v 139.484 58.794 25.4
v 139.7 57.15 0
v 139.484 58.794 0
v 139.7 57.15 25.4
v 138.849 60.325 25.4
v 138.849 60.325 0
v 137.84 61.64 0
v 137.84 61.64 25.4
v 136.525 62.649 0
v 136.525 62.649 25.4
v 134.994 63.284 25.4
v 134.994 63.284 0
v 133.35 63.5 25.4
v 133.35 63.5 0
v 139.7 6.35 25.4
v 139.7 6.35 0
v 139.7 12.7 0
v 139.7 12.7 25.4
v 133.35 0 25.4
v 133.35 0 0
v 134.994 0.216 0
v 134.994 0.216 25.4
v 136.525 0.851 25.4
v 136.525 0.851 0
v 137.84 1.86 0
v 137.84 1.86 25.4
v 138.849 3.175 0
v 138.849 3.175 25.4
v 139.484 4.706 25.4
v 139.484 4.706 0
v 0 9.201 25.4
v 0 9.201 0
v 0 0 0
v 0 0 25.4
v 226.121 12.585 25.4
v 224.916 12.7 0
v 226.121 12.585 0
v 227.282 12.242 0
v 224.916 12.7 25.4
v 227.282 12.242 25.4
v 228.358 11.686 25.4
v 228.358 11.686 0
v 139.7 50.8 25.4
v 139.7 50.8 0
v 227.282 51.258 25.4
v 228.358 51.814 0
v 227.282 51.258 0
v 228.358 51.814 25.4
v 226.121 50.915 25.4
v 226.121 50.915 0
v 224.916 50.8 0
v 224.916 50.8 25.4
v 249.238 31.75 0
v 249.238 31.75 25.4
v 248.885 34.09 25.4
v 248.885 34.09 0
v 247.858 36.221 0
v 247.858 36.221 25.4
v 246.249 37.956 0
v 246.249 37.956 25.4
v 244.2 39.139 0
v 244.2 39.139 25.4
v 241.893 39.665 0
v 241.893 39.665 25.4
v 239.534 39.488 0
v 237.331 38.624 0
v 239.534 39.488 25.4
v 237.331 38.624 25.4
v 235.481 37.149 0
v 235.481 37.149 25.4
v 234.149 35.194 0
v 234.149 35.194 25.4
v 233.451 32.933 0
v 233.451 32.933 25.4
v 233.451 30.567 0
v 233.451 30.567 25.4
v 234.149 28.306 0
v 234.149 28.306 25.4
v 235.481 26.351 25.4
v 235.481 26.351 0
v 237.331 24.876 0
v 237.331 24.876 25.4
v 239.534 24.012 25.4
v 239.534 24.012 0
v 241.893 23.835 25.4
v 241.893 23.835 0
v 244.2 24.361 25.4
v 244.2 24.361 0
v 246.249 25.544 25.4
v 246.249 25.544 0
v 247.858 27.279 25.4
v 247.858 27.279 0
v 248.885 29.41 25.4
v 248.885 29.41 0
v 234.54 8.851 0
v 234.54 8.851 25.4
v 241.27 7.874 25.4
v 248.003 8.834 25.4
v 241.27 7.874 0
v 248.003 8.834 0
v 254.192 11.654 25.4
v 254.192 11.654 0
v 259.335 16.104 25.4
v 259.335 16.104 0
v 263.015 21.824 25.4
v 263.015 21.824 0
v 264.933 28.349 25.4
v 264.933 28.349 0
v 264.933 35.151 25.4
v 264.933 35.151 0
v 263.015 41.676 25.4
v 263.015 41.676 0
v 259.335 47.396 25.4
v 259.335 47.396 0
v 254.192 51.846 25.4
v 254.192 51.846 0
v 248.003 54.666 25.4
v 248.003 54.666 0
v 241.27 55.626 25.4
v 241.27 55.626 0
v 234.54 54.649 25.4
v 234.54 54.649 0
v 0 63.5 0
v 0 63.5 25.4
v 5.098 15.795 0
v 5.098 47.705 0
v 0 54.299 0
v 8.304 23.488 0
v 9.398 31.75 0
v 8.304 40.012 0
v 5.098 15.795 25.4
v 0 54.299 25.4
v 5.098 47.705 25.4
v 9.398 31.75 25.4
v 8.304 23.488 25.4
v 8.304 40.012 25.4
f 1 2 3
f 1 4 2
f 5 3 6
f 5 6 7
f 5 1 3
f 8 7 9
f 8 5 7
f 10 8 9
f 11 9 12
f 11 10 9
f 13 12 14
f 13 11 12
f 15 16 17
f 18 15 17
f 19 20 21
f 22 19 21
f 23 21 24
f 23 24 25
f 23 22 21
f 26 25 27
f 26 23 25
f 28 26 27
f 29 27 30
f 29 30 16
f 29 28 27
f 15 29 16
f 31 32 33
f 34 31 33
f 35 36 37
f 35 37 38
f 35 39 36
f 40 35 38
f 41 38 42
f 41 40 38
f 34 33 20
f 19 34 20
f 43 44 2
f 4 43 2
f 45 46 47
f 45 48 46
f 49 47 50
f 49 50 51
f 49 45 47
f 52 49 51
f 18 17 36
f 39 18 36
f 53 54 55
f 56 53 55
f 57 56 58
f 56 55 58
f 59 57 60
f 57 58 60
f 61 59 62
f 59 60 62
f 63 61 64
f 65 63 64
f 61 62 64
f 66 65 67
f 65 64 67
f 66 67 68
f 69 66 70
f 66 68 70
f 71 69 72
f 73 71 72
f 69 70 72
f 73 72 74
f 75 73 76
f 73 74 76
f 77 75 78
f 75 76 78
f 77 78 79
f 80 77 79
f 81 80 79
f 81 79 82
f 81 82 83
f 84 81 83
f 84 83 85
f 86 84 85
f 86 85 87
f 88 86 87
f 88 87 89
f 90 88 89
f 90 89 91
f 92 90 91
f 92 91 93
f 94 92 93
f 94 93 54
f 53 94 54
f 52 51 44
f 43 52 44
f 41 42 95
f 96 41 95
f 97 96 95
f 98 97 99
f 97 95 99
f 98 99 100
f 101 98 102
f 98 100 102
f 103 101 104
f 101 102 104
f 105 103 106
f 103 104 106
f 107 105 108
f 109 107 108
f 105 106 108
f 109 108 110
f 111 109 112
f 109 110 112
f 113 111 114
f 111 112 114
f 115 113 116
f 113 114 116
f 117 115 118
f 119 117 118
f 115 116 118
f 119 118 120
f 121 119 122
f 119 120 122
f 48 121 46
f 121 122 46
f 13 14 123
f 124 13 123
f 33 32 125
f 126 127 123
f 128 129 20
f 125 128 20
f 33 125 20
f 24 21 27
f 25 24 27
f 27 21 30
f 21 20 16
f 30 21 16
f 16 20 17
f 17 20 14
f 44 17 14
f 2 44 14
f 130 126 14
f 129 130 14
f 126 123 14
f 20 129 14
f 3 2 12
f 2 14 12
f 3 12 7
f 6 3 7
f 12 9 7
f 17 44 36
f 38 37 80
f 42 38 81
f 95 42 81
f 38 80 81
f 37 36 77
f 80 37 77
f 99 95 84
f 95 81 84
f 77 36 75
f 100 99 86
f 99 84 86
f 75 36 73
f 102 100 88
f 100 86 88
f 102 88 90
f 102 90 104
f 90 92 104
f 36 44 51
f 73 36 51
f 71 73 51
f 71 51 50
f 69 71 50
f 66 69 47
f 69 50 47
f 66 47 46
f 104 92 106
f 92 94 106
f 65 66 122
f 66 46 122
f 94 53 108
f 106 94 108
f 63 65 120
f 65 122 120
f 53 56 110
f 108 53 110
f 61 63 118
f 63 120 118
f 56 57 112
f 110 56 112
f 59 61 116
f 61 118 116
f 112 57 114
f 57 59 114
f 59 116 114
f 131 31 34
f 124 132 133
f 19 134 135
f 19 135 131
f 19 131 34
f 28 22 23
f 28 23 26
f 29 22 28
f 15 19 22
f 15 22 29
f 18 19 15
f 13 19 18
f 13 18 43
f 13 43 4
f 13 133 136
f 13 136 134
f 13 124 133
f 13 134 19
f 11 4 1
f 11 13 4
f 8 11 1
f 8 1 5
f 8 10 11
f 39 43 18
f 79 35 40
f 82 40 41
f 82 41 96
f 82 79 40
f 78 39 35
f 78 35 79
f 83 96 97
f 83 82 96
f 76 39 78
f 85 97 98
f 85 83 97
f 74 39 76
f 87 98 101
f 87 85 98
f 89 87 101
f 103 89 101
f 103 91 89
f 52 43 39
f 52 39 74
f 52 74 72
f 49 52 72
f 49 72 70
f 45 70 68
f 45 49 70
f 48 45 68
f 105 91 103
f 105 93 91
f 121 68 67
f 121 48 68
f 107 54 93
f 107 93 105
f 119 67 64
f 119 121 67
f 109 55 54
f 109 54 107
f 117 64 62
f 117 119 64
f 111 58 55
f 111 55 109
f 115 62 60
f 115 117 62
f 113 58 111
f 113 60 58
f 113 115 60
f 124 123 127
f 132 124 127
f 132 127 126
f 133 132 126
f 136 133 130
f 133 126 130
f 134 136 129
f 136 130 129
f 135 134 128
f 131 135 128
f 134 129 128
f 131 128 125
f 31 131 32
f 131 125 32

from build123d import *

# Parameters (mm, degrees)
F1_DEPTH = 25.4
F2_R     = 6.35
F3_R     = 7.9375
F4_DEPTH = 25.401


with BuildPart() as f1:
    # F0 (on Top) → F1 (new body)
    with BuildSketch(Plane.XY):
        with BuildLine():
            Line((0, 9.201151), (0, 0))
            Line((0, 0), (139.7, 0))
            Line((139.7, 0), (139.7, 12.7))
            Line((139.7, 12.7), (226.906916, 12.7))
            ThreePointArc((226.906916, 12.7), (265.176, 31.75), (226.906916, 50.8))
            Line((226.906916, 50.8), (139.7, 50.8))
            Line((139.7, 50.8), (139.7, 63.5))
            Line((139.7, 63.5), (0, 63.5))
            Line((0, 63.5), (0, 54.298849))
            ThreePointArc((0, 54.298849), (9.398, 31.75), (0, 9.201151))
        make_face()
    extrude(amount=F1_DEPTH)

    # F2
    f2_edges = [f1.edges().sort_by_distance(p)[0] for p in [
        (139.7, 0, 12.7),
        (139.7, 63.5, 12.7),
        (226.906916, 12.7, 12.7),
        (226.906916, 50.8, 12.7),
    ]]
    fillet(f2_edges, radius=F2_R)

    # F3 (on face) → F4 (cut, through all)
    with BuildSketch(Plane.XY.offset(25.4)):
        with Locations((241.3, 31.75)):
            Circle(F3_R)
    extrude(amount=-F4_DEPTH, mode=Mode.SUBTRACT)


solid = f1.part
